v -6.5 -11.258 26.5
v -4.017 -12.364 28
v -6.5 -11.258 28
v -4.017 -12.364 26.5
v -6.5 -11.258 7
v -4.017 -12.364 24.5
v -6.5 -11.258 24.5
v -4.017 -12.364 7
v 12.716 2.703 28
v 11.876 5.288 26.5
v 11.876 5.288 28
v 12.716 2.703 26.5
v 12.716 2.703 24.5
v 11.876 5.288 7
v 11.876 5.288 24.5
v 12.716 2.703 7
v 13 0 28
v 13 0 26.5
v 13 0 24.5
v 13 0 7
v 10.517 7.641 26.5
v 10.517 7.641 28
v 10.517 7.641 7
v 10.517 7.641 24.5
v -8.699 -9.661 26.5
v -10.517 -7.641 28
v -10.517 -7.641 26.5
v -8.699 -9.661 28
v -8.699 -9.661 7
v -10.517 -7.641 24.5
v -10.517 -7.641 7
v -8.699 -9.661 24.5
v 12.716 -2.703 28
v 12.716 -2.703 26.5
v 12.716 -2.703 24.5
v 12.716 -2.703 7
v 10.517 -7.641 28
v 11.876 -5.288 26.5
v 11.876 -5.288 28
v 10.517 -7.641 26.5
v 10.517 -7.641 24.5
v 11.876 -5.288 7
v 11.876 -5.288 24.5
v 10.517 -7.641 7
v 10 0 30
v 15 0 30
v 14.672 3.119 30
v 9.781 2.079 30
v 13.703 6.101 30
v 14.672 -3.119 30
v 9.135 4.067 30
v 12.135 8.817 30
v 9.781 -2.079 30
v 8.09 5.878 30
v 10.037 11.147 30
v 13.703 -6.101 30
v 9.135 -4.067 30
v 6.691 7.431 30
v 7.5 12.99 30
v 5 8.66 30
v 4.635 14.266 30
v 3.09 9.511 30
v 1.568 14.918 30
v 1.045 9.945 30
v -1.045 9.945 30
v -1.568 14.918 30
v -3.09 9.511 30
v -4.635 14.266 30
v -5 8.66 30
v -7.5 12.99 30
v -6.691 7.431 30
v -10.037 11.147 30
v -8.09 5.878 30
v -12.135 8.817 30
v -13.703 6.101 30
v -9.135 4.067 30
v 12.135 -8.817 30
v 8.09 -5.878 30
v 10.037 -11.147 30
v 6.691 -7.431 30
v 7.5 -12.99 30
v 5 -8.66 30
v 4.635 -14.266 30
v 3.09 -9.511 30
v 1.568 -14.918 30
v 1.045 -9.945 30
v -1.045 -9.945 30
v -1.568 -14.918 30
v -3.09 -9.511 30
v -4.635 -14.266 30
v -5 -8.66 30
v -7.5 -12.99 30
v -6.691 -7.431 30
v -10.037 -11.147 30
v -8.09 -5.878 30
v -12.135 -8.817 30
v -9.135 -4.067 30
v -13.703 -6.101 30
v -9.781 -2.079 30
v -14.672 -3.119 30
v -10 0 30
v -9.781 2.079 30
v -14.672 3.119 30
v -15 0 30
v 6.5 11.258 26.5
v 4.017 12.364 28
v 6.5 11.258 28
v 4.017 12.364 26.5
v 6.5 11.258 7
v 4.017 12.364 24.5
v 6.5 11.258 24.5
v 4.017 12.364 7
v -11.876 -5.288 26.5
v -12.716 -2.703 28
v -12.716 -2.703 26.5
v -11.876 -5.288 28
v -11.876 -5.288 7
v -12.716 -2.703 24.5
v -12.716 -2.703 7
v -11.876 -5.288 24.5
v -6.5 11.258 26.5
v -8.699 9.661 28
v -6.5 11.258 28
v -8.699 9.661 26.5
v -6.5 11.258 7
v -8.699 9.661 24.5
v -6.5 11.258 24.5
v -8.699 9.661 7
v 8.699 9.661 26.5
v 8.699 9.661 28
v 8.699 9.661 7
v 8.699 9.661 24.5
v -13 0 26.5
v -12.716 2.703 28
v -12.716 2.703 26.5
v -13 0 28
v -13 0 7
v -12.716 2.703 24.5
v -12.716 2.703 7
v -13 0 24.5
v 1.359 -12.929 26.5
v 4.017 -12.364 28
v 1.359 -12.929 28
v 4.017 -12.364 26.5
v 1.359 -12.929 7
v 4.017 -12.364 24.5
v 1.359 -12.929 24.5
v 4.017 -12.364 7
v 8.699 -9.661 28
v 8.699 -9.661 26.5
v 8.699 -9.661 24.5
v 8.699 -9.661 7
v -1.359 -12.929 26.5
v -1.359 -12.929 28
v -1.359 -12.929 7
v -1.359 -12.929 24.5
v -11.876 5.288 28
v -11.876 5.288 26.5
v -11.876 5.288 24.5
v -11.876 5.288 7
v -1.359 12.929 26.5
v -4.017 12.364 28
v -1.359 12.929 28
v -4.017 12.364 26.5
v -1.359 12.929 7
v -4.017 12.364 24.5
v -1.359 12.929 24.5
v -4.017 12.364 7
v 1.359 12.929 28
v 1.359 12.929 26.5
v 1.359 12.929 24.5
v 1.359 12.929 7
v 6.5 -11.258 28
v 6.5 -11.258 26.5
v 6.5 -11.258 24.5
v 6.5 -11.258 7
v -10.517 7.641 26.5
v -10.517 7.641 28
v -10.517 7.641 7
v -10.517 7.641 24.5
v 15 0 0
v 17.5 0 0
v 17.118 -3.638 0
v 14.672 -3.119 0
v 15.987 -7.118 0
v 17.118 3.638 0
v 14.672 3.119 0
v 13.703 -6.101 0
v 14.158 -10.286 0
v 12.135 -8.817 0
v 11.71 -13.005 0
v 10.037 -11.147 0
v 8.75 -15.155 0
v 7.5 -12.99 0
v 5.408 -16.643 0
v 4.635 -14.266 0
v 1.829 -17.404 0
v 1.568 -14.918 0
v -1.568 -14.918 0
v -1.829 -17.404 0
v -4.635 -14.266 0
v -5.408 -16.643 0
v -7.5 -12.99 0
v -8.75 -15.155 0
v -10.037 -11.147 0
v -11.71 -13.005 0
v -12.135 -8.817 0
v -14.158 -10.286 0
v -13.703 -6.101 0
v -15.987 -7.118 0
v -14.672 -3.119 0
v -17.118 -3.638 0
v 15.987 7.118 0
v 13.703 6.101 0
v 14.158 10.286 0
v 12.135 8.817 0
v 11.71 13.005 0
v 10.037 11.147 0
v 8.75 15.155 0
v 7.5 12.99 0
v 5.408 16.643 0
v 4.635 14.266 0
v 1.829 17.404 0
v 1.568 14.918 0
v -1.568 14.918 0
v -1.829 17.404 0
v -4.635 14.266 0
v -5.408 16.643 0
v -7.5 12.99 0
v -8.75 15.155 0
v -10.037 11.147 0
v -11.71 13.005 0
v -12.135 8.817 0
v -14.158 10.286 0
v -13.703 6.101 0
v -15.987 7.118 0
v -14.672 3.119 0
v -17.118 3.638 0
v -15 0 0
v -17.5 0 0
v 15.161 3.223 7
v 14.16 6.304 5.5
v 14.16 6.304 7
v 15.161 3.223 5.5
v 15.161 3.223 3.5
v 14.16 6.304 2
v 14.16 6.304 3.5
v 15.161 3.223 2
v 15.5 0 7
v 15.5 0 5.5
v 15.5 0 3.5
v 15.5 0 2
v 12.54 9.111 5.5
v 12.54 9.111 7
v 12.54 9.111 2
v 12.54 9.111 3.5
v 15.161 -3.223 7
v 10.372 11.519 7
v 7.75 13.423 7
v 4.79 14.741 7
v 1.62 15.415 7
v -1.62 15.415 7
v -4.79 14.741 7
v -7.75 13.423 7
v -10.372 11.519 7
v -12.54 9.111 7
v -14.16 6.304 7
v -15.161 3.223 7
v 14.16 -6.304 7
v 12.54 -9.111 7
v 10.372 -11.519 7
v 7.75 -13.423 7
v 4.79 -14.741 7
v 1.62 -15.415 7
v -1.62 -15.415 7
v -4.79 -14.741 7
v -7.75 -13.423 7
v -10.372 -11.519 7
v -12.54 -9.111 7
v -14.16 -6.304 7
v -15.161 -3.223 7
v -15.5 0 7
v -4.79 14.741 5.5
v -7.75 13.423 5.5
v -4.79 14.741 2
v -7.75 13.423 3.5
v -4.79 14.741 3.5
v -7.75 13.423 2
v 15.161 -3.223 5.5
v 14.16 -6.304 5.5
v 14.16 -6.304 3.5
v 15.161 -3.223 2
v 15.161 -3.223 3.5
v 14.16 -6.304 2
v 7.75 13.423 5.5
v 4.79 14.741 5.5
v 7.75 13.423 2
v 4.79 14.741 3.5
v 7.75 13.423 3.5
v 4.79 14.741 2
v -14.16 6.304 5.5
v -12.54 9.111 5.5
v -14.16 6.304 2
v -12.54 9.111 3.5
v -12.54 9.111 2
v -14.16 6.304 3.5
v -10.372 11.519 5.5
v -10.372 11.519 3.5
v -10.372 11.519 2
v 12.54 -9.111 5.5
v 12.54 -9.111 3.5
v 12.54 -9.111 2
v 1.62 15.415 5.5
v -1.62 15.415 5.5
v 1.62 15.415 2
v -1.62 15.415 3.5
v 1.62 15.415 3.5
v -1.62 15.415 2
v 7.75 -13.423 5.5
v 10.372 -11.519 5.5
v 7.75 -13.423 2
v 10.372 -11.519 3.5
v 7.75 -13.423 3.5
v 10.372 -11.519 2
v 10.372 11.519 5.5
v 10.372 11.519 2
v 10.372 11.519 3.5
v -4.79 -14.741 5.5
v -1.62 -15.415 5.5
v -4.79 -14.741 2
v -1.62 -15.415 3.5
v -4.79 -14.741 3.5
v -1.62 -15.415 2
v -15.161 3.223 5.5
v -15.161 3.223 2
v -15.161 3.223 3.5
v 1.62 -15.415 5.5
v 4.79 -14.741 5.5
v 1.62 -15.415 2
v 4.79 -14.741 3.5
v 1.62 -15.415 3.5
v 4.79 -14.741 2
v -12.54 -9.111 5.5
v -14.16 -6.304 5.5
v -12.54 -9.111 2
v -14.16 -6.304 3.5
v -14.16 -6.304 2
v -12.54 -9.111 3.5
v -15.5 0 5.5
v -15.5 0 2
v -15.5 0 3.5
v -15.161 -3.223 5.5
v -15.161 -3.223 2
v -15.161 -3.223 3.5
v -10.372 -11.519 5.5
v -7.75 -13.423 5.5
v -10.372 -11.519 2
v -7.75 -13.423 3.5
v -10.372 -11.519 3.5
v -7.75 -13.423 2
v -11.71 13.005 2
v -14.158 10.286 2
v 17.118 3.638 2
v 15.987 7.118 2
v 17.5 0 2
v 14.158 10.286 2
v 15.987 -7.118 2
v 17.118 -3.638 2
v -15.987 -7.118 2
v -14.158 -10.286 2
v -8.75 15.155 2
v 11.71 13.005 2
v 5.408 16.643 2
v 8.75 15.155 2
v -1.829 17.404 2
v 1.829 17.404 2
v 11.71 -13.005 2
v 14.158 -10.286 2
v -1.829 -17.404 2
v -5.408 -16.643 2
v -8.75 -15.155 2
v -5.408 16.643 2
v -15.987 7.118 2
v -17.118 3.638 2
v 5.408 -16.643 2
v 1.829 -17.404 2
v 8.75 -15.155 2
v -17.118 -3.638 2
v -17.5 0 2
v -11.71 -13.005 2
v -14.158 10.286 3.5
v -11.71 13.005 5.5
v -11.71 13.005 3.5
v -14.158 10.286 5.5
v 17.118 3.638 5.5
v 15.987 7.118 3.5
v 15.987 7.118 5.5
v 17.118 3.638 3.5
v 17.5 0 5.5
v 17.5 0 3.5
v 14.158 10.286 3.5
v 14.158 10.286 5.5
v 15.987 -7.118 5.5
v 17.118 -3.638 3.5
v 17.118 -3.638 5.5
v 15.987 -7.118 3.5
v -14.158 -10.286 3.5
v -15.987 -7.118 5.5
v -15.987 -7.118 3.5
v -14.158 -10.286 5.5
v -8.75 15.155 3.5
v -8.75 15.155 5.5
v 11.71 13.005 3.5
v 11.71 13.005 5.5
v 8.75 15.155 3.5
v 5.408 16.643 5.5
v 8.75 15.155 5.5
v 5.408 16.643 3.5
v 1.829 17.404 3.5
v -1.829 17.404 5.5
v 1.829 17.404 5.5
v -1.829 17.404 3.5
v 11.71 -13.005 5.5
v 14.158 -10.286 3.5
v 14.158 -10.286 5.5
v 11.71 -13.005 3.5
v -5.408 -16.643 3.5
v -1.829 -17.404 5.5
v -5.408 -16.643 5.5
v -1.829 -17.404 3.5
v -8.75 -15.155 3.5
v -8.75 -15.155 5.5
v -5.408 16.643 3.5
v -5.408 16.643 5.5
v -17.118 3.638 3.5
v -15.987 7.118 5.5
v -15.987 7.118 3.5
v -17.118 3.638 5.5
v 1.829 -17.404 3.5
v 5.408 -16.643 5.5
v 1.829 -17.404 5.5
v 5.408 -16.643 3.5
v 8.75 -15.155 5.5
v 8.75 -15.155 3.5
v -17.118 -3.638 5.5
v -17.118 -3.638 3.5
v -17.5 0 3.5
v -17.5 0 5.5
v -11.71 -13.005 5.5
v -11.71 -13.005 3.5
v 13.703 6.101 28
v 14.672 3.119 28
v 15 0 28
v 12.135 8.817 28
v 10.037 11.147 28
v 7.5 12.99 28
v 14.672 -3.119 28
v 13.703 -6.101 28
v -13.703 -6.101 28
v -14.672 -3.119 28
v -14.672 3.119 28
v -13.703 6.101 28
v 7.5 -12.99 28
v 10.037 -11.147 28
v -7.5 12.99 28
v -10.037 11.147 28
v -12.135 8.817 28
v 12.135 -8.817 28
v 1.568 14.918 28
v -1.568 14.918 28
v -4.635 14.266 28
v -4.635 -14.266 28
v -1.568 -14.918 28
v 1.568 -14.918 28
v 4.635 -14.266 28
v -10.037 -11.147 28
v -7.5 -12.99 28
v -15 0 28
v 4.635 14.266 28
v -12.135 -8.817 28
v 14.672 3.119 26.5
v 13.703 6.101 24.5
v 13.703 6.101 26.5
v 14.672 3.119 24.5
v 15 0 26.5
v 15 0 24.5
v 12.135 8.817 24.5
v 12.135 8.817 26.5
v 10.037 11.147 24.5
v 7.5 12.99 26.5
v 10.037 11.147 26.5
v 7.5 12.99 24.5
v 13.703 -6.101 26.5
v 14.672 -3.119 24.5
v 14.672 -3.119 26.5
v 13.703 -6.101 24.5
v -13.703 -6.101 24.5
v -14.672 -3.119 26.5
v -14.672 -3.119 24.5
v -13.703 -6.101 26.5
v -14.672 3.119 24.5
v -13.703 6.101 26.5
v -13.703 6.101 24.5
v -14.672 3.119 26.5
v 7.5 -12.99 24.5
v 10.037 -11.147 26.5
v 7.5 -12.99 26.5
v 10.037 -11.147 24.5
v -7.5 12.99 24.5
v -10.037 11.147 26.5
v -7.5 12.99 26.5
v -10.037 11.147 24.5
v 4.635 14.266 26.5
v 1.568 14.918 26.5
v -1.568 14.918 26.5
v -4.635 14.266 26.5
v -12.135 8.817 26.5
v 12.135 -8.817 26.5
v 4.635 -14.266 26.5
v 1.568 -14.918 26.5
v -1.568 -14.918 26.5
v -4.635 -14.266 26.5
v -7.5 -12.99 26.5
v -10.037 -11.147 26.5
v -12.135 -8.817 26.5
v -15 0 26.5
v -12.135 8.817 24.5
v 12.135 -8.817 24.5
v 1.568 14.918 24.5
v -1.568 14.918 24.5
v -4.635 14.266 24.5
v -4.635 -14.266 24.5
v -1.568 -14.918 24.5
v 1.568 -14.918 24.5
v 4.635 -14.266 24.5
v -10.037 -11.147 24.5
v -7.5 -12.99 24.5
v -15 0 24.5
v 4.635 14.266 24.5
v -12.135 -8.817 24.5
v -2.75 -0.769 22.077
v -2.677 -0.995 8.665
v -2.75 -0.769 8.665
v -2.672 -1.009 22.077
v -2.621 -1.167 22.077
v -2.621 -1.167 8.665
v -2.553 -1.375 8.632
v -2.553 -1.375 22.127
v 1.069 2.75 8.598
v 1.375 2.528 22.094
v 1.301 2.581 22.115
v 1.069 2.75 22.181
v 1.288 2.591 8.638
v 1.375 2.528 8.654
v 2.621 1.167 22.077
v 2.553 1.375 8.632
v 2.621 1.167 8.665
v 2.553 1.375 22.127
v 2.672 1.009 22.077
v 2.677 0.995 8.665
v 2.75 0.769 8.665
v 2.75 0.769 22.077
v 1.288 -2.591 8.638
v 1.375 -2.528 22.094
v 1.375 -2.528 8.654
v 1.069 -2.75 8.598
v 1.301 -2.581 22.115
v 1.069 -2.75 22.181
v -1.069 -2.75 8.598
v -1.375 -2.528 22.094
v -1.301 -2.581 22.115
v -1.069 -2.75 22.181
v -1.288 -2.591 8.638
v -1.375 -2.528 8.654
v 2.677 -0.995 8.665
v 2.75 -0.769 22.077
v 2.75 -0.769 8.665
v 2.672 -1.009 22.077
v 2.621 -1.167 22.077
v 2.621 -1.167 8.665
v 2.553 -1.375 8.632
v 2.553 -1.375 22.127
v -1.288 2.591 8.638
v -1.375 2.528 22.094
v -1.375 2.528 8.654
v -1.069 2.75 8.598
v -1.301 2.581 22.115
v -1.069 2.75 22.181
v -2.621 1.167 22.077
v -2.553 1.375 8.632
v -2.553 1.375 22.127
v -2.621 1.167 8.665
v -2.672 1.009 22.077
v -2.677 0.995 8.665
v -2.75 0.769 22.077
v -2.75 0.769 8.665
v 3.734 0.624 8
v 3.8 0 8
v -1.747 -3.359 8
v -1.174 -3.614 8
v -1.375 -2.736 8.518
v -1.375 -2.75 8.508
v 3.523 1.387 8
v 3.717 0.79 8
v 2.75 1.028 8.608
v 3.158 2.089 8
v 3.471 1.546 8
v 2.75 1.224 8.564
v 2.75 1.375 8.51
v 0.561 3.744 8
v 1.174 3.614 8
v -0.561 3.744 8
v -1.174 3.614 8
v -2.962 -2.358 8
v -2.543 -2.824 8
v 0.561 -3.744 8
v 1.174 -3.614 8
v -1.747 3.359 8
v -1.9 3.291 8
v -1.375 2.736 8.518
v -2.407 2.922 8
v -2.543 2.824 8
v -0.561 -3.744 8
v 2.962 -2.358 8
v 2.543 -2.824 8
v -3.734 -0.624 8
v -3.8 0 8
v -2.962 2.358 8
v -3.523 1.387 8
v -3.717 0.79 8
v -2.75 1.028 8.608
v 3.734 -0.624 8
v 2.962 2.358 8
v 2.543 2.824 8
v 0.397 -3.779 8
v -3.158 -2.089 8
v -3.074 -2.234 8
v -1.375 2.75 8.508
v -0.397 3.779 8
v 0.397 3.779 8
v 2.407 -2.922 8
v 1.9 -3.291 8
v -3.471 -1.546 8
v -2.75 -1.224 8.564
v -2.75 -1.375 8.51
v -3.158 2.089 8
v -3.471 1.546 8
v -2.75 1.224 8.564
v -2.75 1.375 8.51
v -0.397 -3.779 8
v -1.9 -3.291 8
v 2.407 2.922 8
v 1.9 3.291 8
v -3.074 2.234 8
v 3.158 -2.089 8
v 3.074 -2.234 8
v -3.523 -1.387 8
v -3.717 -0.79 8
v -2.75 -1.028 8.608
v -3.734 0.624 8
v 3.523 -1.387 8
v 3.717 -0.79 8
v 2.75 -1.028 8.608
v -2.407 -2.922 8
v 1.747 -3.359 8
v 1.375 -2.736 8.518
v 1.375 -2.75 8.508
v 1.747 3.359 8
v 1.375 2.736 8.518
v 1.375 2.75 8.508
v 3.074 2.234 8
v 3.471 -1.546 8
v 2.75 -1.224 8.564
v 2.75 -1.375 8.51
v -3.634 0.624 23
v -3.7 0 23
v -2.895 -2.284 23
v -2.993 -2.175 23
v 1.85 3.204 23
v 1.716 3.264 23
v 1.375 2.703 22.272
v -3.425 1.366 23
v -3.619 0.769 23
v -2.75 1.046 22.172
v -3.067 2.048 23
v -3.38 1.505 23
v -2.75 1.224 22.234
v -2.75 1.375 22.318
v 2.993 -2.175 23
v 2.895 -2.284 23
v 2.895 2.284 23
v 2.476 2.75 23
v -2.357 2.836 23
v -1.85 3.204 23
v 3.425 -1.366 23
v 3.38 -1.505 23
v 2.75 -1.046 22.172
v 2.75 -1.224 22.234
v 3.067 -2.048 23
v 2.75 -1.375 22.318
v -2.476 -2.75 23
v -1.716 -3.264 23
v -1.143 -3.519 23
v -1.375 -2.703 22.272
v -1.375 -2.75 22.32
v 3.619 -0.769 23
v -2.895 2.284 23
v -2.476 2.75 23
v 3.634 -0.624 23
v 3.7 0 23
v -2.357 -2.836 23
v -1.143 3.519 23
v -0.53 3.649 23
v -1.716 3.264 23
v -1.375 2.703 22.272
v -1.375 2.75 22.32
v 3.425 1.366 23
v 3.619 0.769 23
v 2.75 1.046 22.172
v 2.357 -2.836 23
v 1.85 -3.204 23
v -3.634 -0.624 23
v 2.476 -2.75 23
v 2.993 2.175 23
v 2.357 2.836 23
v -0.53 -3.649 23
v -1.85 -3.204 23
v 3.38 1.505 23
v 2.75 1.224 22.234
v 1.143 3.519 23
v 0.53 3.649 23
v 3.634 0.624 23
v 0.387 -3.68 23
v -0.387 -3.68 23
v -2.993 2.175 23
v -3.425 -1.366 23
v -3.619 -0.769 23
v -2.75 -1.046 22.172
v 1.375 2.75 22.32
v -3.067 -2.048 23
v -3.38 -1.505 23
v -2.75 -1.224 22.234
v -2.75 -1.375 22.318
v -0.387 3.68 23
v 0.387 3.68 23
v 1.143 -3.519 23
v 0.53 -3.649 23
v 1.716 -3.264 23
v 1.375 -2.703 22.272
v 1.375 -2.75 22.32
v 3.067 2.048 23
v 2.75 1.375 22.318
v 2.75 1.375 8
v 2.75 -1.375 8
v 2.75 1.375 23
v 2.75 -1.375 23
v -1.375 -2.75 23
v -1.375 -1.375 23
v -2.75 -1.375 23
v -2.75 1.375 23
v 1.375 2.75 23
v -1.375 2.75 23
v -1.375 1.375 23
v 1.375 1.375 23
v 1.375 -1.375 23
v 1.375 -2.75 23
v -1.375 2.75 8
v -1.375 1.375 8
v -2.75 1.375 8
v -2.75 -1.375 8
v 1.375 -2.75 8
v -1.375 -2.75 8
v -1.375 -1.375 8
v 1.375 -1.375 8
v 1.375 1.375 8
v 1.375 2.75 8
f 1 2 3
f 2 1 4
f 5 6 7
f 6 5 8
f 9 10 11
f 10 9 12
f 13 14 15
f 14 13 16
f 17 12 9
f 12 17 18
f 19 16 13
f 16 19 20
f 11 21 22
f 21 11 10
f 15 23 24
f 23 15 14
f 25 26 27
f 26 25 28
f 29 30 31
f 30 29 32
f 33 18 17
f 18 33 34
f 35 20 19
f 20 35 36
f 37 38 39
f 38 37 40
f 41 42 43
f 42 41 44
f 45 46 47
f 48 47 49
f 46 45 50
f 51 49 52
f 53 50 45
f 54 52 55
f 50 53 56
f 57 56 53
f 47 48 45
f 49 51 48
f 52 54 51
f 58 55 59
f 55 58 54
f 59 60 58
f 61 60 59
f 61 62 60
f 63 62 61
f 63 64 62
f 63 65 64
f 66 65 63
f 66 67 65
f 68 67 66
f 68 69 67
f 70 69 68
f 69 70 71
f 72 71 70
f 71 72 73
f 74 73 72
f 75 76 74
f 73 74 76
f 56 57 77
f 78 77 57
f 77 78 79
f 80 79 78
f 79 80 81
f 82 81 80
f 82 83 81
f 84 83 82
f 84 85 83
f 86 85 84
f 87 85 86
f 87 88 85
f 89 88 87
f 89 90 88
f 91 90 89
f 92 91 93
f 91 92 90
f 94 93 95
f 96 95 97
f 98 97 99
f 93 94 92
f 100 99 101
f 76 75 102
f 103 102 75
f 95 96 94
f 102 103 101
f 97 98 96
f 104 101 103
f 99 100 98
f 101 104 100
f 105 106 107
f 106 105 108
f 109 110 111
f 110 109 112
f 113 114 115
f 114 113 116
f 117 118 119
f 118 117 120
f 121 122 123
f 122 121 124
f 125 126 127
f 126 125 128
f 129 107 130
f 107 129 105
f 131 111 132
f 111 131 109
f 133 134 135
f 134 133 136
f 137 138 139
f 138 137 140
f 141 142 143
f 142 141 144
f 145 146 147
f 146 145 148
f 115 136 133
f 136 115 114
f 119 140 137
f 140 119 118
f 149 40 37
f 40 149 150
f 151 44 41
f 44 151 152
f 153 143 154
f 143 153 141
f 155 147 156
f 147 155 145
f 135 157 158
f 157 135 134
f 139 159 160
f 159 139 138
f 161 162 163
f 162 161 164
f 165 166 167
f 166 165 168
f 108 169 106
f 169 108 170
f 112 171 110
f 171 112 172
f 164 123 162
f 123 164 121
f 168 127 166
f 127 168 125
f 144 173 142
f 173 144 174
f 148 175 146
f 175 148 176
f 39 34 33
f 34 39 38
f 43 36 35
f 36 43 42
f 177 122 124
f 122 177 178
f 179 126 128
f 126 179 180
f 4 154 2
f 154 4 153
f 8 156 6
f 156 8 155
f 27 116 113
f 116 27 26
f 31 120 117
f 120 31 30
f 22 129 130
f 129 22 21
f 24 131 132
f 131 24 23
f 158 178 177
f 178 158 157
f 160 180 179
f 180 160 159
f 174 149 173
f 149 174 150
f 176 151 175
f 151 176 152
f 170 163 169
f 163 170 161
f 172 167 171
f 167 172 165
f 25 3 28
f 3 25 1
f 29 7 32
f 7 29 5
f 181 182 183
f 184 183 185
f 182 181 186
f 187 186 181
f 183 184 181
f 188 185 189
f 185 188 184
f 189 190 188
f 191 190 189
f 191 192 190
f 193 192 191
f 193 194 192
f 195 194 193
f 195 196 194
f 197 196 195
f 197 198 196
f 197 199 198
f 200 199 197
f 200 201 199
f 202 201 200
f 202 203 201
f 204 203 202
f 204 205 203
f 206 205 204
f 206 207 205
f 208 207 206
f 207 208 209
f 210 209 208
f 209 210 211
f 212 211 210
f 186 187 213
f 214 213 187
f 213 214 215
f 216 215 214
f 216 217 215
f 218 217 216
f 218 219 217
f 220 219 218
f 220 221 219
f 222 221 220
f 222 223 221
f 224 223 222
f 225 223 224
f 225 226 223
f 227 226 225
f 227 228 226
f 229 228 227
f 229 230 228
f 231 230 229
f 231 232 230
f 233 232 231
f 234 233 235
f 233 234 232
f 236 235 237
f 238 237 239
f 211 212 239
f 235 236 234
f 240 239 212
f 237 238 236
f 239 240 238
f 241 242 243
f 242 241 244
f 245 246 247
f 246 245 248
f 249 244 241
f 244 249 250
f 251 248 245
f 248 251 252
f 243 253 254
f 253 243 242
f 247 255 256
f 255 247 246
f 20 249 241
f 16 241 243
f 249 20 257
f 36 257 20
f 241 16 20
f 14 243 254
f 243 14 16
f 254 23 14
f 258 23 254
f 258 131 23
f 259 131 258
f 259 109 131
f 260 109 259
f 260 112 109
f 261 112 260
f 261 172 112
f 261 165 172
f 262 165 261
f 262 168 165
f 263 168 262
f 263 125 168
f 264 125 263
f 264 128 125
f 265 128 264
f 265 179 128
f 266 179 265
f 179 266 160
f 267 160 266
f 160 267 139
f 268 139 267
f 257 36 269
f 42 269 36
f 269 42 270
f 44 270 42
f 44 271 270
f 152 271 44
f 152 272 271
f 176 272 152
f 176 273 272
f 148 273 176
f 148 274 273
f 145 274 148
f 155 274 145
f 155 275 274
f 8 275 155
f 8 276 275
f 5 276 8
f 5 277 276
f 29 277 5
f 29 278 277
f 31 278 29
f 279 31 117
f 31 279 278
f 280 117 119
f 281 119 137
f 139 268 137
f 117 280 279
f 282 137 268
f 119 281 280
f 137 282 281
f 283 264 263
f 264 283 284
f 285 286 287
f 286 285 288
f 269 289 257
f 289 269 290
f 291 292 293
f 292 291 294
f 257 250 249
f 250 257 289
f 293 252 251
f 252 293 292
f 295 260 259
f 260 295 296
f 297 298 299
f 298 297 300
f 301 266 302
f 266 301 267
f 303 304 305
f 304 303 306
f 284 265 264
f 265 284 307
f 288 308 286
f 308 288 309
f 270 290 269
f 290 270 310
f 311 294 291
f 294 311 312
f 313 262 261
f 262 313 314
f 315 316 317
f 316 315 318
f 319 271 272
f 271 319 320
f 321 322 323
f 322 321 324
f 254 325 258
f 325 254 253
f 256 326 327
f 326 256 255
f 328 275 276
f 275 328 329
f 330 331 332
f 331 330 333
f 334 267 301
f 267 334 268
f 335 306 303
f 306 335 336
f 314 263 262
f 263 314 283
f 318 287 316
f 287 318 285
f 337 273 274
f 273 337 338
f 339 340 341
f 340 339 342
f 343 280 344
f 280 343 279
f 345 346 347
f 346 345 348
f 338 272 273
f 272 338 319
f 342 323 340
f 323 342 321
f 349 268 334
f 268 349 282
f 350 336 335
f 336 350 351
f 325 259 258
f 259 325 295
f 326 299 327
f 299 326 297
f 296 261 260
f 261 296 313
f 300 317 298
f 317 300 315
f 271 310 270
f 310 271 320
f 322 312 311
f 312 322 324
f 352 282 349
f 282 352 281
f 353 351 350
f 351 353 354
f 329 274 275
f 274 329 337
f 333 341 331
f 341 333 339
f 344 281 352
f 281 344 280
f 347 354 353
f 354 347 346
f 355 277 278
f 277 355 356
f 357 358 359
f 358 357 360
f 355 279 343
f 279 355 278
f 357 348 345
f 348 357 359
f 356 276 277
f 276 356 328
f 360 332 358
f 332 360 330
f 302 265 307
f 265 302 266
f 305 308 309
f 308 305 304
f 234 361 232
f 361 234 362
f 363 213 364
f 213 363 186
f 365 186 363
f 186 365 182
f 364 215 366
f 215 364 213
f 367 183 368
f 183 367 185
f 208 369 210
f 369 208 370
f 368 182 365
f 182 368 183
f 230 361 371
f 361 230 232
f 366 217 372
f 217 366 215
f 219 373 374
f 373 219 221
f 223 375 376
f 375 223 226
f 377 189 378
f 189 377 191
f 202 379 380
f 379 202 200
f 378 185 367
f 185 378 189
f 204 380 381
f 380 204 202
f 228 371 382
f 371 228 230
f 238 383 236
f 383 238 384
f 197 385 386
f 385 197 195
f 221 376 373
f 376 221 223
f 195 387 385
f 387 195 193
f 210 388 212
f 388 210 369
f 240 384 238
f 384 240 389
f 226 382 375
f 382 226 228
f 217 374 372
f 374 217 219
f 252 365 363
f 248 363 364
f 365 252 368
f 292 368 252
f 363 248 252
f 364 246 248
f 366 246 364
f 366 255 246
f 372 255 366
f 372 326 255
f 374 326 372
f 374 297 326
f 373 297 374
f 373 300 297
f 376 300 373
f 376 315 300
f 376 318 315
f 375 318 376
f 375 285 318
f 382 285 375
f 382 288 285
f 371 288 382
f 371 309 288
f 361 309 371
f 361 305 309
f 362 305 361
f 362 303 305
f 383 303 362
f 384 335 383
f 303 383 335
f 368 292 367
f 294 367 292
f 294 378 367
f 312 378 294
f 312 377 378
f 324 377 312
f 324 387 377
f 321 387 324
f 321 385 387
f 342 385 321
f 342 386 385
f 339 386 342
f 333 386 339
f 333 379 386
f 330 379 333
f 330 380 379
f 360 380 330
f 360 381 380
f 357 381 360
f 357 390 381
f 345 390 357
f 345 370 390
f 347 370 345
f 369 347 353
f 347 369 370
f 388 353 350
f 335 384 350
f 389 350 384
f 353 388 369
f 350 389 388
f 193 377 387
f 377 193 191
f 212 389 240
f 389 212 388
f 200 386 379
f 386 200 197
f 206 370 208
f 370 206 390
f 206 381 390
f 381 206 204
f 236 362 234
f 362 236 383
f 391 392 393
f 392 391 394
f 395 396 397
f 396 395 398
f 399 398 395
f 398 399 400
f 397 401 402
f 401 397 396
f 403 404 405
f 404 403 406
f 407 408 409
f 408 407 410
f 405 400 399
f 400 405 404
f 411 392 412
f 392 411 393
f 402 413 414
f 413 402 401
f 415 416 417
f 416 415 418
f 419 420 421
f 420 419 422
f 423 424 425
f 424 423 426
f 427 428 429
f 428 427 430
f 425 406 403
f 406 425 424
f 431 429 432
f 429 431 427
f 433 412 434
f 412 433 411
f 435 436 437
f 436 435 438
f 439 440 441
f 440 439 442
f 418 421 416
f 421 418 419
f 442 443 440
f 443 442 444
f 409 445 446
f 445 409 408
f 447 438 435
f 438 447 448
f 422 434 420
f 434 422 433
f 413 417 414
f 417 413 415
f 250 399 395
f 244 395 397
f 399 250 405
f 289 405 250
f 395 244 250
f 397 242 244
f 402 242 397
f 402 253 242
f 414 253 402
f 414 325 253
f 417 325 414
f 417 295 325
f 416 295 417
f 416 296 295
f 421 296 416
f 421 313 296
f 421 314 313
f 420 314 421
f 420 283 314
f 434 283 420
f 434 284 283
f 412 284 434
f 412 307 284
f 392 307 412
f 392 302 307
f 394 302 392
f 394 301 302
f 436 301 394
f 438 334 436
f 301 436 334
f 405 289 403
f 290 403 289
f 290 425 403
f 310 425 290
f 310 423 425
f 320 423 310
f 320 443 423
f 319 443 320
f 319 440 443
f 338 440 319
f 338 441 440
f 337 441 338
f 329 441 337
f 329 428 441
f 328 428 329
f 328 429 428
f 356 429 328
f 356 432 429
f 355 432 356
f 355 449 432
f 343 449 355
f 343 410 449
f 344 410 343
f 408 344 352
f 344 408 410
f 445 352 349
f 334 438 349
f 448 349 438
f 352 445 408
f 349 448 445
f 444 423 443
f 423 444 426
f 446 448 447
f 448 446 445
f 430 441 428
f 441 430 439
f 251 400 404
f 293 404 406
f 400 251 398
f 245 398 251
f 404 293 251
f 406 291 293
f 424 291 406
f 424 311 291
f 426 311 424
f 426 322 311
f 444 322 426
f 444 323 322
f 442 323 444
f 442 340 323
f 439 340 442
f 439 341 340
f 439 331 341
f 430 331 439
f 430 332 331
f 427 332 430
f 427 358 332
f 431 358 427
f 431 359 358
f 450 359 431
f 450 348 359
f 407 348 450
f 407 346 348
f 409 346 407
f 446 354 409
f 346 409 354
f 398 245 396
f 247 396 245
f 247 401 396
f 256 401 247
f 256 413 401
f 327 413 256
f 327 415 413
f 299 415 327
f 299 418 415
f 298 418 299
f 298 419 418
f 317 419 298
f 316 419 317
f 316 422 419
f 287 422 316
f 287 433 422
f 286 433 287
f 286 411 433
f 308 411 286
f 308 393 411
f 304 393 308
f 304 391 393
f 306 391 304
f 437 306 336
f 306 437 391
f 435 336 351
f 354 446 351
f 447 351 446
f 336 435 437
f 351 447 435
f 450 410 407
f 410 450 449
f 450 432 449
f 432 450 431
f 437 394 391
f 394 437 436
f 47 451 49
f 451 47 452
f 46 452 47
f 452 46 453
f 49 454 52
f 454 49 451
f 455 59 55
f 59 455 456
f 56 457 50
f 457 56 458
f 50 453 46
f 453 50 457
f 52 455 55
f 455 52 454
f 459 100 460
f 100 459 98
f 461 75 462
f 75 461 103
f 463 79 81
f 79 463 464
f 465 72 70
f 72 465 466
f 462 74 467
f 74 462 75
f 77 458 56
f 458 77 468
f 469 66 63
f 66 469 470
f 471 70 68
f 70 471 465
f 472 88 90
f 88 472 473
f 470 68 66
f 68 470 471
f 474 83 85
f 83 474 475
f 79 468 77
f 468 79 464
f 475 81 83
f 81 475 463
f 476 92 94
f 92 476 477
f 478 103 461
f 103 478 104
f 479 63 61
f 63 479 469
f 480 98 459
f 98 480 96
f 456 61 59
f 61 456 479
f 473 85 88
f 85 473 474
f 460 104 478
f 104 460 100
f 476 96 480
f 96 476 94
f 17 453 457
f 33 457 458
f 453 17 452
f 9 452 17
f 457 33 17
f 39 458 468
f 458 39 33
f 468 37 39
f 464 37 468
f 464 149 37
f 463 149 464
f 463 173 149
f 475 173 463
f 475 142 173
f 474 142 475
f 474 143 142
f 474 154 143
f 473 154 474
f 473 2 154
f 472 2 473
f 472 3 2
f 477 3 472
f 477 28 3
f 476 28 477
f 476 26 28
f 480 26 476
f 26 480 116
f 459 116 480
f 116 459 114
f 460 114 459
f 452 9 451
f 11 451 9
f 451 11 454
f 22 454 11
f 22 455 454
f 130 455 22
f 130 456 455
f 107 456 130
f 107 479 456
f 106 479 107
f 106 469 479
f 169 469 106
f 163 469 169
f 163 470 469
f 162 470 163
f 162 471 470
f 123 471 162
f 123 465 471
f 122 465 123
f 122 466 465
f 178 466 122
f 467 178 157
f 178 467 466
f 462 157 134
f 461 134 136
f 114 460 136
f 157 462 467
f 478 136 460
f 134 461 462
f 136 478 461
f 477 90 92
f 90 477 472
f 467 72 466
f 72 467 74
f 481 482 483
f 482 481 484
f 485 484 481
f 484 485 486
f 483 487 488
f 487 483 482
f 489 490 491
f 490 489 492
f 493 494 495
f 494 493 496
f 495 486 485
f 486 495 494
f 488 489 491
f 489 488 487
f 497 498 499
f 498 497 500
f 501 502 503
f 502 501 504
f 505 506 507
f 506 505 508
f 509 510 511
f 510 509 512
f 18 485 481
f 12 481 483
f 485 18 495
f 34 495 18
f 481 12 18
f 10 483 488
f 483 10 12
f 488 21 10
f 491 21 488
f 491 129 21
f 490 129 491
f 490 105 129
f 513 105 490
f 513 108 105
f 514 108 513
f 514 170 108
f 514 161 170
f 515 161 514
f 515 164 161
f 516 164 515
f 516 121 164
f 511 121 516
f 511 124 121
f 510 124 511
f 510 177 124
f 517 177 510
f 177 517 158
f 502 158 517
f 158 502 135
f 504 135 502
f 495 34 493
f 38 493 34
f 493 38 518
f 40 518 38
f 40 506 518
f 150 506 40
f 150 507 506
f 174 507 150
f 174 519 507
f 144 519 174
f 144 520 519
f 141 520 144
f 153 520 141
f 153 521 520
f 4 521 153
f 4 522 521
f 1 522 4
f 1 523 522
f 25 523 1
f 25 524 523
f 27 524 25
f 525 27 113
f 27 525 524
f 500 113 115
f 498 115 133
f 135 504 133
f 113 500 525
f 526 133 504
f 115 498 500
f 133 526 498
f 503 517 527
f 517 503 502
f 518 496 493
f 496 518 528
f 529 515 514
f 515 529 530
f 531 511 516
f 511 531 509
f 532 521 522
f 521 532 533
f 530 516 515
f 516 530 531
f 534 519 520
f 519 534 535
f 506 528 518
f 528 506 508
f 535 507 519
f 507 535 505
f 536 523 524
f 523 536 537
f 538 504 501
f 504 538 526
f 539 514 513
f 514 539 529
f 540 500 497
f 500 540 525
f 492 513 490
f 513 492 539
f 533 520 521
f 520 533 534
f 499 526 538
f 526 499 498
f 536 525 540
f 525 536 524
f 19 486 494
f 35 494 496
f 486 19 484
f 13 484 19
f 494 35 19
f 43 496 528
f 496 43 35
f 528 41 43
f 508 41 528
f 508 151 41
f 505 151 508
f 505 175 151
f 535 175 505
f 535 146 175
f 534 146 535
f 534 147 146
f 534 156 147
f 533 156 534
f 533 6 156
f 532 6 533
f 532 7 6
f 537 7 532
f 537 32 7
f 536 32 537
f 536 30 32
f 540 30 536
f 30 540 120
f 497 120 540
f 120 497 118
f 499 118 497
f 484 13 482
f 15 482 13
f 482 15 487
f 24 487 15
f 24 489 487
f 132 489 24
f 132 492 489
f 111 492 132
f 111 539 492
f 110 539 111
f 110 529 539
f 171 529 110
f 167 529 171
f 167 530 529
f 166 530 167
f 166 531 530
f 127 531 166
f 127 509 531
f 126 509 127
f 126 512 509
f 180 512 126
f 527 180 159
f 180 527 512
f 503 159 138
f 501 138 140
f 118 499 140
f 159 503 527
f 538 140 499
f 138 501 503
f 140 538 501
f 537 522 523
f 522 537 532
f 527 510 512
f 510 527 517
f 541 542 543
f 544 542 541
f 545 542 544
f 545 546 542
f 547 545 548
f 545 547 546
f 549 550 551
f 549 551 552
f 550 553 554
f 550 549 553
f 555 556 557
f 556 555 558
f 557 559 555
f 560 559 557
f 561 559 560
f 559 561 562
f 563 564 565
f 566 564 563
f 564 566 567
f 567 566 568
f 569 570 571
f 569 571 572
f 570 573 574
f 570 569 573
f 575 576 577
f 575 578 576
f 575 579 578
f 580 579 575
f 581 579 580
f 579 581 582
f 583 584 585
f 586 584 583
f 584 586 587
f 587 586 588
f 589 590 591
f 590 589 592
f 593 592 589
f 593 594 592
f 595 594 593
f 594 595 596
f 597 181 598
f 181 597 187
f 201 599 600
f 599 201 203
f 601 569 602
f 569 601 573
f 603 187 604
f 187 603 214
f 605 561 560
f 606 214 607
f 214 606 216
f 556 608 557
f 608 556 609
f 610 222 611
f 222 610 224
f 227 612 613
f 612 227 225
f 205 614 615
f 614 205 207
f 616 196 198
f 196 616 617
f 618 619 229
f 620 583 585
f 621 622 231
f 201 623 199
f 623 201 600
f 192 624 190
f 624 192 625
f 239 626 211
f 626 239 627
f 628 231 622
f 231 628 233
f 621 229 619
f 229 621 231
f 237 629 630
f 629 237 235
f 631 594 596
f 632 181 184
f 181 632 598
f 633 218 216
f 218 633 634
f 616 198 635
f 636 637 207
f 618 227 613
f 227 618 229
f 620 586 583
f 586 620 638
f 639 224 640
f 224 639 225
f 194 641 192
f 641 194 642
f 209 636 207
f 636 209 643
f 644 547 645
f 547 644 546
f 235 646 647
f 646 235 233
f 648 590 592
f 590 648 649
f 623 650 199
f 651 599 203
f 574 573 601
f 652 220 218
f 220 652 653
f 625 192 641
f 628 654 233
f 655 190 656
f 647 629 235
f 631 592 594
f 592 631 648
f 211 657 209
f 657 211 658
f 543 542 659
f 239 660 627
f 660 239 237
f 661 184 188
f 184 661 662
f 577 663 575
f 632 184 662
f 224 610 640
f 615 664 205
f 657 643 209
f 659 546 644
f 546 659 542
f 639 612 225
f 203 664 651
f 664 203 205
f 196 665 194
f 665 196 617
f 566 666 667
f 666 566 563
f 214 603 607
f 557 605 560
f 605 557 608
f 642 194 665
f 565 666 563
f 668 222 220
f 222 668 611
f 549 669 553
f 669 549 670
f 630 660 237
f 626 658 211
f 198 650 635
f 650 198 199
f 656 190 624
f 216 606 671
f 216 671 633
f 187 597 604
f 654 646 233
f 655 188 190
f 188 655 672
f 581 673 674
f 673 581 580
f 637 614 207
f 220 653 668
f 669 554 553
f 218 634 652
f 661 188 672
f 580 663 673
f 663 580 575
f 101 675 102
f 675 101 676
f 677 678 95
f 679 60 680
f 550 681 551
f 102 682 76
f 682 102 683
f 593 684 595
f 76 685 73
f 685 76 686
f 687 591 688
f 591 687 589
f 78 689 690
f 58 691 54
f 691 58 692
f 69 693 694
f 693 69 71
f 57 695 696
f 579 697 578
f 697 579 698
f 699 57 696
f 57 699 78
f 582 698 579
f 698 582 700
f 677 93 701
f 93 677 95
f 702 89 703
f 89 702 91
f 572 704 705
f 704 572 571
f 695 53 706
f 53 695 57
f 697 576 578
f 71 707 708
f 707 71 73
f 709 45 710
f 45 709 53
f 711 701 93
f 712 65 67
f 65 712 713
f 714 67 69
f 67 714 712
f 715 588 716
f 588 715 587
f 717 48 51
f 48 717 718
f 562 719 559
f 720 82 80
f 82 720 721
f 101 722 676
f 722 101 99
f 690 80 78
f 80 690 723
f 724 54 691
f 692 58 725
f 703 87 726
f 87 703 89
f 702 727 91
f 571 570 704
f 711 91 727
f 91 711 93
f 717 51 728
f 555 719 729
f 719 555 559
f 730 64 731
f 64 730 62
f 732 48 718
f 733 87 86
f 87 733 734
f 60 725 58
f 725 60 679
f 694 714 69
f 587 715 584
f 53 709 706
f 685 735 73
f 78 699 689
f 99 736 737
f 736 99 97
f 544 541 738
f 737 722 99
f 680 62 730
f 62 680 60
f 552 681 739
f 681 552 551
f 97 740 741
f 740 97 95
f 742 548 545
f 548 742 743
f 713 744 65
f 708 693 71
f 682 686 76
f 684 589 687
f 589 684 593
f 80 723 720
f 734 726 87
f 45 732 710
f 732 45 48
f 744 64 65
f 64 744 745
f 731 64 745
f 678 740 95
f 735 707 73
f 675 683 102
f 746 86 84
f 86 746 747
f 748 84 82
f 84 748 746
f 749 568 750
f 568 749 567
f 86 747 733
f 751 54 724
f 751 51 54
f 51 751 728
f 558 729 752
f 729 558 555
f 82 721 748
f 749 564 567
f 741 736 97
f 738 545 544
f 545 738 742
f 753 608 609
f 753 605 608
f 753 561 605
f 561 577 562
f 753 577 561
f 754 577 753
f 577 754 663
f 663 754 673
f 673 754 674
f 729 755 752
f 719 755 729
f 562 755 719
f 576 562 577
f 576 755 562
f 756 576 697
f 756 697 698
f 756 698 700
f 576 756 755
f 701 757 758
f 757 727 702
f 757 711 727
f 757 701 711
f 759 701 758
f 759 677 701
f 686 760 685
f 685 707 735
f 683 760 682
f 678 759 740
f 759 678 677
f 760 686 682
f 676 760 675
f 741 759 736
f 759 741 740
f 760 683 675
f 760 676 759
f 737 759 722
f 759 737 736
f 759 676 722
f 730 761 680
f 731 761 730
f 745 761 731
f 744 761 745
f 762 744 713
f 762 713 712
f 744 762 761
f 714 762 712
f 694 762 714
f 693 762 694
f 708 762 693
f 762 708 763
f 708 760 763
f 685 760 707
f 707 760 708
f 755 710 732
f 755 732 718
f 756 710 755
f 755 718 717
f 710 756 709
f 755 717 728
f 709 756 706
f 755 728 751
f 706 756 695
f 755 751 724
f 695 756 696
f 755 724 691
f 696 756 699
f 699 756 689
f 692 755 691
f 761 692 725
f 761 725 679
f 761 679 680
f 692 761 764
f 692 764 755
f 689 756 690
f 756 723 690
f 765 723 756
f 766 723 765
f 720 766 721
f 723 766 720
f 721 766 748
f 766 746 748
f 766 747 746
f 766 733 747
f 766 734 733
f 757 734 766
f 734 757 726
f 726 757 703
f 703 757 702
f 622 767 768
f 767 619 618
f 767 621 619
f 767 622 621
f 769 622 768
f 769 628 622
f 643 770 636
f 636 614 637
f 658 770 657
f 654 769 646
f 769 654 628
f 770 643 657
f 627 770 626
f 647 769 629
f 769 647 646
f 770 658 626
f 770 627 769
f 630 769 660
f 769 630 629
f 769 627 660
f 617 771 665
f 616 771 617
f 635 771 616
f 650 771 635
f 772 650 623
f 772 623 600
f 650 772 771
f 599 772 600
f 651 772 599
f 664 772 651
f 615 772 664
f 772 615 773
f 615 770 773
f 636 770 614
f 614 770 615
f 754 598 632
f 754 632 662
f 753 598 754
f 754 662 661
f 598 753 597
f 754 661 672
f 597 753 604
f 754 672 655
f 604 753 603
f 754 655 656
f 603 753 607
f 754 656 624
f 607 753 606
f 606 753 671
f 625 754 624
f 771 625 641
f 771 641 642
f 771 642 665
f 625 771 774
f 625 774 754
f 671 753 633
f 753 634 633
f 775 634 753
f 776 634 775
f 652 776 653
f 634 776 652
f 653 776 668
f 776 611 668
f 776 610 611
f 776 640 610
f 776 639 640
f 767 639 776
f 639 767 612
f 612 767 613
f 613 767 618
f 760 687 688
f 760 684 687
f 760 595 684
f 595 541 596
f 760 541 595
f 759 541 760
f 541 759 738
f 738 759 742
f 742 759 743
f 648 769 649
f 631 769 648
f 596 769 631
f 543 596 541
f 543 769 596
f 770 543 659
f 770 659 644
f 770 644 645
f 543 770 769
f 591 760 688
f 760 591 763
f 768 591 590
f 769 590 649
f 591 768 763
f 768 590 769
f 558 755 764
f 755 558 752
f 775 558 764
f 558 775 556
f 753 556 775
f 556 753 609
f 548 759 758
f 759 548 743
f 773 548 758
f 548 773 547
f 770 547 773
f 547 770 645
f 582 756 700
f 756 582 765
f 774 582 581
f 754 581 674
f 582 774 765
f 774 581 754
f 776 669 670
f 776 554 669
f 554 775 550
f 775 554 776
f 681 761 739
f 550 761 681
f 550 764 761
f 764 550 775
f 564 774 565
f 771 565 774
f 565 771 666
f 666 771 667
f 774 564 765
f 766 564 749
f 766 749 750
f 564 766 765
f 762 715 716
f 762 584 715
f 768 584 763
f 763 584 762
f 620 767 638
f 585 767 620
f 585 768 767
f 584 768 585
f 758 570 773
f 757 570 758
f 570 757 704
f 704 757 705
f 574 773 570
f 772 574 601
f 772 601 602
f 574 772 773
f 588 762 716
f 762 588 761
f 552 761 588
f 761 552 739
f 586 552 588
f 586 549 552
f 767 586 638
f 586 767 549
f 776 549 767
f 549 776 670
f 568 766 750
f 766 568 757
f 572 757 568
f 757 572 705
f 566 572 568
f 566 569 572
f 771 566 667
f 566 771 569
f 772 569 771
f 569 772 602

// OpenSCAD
hoogtegrip = 15;
gripoffset = 15.5;

module wiel()
    difference()
    {
        union()
            {
            cylinder(r=26/2,h=30);
            cylinder(r=31/2,h=7);        
            
            cylinder(r=35/2,h=2);    
            
            translate([0,0,3.5])
             cylinder(r=35/2,h=2);        
            
            translate([0,0,30-2])
             cylinder(r=30/2,h=2);    
            
            translate([0,0,30-2-1.5-2])
             cylinder(r=30/2,h=2);      
                
                
            }
        
        union()
            {
            cylinder(r=6/2,h=30);
            cylinder(10,15);   
               
            translate([0,0,30])
            rotate(a=[0,180,0])
            cylinder(10,10);     
            }
        
    }
    
module grip()
    
difference()
{
    union()
    {
    translate([0,0,gripoffset])    
    cube(size=[10,10,hoogtegrip],center=true);
    }    

    union()
    {
    //translate([(10-5.5)/2,10/2-5.5/2/2,0])    
    translate([0,0,gripoffset])
    cube(size=[5.5,5.5/2,hoogtegrip],center=true);
    
    //translate([10/2-5.5/2/2,(10-5.5)/2,0])    
    translate([0,0,gripoffset])
    cube(size=[5.5/2,5.5,hoogtegrip],center=true);    
    }    
}

wiel();
grip();
